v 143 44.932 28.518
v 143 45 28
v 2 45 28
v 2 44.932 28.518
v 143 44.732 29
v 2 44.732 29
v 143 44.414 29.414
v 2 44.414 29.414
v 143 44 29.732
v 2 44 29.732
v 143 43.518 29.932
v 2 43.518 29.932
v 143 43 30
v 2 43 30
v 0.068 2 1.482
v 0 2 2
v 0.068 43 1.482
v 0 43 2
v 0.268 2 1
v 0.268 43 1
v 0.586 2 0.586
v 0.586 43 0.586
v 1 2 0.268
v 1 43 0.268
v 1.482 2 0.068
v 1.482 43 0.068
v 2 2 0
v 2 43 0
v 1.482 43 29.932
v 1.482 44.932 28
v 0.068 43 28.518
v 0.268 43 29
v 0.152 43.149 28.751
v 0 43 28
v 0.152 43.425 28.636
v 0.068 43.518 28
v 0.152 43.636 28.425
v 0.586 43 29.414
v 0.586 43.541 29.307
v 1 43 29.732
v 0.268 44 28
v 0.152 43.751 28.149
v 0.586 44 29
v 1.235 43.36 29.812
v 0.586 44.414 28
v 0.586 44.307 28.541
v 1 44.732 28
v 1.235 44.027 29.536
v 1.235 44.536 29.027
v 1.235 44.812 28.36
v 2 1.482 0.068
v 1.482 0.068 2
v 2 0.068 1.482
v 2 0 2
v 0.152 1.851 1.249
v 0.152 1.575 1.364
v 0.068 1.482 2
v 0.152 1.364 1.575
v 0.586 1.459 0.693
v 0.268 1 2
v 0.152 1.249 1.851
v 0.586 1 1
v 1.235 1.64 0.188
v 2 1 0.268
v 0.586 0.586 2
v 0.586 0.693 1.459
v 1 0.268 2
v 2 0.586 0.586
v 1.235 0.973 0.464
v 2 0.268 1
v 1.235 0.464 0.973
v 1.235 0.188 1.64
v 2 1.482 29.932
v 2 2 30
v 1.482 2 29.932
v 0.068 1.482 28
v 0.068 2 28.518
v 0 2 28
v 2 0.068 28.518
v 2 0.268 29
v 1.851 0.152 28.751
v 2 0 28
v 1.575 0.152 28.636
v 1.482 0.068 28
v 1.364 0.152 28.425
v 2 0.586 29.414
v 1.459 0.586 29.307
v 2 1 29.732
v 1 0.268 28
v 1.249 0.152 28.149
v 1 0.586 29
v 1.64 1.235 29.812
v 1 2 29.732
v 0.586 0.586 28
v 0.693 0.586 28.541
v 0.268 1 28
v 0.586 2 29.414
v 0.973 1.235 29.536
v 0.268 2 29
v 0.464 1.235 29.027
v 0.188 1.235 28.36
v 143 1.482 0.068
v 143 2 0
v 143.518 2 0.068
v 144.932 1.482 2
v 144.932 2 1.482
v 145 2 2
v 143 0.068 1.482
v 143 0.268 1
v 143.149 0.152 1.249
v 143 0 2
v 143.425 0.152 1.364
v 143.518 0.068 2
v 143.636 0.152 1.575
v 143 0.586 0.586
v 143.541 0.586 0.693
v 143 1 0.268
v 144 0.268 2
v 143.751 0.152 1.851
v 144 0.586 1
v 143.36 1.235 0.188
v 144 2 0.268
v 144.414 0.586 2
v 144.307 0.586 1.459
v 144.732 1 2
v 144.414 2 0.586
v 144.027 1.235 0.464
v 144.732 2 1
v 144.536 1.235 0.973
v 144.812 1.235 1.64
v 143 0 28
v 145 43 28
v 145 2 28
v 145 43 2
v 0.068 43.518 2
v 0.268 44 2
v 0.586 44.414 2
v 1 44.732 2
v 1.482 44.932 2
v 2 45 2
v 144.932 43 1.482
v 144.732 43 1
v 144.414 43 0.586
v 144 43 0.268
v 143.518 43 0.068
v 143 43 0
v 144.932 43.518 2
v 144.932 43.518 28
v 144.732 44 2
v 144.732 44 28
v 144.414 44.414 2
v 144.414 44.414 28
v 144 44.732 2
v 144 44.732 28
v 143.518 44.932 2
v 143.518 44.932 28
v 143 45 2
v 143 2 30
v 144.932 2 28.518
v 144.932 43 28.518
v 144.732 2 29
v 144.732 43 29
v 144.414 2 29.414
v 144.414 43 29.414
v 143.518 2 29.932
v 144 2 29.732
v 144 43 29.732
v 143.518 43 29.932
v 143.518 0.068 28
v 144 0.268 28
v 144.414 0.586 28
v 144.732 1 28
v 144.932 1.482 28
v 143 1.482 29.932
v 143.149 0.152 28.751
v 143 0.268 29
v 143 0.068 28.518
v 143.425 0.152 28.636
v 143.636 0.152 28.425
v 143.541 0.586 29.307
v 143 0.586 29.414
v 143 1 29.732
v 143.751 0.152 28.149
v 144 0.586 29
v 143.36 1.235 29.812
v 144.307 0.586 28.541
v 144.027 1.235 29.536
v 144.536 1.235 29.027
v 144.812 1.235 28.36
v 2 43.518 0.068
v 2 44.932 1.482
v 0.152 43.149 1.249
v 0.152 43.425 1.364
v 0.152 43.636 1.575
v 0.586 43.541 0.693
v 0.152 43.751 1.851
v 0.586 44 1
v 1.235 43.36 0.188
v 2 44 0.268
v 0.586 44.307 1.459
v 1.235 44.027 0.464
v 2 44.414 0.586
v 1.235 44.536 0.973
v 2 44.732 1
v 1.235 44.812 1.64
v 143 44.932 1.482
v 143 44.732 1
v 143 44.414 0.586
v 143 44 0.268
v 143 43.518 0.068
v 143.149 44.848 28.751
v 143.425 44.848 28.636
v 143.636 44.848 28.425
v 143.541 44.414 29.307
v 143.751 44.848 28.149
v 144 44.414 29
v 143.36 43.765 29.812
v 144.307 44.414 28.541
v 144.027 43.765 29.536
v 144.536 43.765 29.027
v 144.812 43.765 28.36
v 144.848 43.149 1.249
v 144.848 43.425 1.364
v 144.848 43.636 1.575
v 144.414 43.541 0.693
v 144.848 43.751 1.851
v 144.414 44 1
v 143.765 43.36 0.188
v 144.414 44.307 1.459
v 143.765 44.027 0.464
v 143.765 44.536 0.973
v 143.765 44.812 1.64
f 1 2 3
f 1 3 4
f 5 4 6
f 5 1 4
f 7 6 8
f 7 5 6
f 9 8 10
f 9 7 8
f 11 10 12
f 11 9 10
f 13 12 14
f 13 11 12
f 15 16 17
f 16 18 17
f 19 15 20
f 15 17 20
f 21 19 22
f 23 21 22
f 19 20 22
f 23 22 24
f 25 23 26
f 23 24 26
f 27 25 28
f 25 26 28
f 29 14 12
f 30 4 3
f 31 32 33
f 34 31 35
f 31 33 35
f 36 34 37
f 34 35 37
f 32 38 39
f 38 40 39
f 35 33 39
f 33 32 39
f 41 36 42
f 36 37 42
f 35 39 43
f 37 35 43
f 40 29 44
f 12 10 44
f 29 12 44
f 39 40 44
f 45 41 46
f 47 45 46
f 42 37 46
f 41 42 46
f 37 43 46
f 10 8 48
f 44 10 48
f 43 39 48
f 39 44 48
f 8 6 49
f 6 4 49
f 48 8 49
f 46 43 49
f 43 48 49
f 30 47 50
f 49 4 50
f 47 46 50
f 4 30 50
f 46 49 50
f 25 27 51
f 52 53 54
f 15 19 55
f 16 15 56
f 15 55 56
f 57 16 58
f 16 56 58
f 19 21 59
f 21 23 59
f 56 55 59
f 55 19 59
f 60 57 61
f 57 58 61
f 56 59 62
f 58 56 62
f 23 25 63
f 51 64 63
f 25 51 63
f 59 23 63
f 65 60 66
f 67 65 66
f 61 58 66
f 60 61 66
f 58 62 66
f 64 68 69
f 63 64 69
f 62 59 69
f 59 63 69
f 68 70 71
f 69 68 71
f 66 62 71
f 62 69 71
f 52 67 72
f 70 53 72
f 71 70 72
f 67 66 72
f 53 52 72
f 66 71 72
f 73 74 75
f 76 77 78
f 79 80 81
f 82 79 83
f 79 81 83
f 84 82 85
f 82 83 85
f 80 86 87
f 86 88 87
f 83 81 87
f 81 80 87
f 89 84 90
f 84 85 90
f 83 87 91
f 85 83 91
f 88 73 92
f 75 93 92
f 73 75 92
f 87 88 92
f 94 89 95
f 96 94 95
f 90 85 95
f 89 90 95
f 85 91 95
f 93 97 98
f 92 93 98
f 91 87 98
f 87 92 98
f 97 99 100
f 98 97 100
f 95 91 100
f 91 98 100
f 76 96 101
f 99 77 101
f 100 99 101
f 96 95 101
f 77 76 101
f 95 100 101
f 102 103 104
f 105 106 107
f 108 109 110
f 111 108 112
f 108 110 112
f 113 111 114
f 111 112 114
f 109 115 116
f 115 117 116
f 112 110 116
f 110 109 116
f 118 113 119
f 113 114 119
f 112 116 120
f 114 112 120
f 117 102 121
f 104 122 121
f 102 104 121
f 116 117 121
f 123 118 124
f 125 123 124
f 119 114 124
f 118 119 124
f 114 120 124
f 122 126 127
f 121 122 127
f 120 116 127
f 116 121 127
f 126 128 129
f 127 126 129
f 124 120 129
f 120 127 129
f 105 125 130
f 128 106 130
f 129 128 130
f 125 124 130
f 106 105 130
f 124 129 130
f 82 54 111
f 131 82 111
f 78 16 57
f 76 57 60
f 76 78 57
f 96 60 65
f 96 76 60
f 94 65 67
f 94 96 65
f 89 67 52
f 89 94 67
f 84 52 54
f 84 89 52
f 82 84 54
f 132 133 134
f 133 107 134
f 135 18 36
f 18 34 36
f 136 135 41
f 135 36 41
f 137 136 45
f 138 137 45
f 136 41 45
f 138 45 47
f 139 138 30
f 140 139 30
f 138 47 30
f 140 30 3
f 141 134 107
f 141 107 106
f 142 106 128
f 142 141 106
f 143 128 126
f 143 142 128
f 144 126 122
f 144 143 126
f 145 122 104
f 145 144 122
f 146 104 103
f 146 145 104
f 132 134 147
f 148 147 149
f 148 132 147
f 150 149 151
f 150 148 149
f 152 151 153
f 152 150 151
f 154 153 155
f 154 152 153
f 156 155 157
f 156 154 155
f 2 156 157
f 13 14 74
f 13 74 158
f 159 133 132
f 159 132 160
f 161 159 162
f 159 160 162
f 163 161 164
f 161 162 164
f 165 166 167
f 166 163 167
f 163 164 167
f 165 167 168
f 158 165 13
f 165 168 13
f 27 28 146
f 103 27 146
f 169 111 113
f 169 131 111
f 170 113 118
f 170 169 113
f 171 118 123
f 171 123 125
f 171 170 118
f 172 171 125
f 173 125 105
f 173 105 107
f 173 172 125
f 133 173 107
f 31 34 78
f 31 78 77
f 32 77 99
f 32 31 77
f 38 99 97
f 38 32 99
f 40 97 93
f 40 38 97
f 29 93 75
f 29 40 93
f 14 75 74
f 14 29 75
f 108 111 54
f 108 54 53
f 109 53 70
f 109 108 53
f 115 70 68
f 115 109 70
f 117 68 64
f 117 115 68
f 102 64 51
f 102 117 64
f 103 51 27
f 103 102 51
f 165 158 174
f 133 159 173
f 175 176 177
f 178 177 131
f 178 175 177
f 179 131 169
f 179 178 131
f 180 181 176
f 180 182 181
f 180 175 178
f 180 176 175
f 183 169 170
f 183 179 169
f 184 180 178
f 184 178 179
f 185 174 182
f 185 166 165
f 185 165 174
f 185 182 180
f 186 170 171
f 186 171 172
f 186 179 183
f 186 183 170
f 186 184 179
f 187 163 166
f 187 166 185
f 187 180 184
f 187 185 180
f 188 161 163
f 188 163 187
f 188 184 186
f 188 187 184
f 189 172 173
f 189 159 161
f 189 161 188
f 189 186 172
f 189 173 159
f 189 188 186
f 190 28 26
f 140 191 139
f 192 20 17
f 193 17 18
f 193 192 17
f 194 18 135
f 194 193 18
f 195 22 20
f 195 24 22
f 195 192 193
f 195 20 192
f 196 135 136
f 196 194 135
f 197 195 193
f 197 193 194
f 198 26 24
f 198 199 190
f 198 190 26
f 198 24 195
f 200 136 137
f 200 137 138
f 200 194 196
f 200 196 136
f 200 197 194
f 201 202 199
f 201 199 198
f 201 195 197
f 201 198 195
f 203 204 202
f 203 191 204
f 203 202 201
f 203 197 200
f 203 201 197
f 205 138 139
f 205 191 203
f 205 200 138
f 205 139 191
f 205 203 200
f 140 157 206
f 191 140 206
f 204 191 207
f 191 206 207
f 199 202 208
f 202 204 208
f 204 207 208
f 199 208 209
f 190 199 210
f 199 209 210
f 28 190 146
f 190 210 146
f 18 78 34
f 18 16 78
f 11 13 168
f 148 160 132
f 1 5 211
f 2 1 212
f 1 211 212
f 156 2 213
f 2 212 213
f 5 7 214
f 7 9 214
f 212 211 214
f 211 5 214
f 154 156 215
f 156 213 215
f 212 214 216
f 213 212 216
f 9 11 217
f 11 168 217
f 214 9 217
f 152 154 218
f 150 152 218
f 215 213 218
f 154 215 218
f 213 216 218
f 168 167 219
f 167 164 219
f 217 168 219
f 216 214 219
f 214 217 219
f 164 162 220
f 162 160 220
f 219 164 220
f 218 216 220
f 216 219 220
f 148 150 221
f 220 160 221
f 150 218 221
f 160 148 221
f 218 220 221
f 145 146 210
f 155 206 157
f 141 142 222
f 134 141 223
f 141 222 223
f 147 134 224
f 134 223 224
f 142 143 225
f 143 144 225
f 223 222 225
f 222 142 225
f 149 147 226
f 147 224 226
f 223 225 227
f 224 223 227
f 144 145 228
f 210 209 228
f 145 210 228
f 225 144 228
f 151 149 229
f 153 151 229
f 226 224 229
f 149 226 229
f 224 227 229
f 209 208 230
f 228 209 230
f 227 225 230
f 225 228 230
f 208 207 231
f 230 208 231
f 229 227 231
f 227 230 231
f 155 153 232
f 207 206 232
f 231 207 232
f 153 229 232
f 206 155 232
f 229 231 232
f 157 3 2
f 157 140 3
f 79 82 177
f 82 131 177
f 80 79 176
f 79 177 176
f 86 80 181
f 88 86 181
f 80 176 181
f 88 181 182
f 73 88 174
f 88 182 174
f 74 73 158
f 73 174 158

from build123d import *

# Parameters (mm, degrees)
ESQUISSE1_W        = 145
ESQUISSE1_H        = 45
BOSS_EXTRU_1_DEPTH = 30
CONG_1_R           = 2


with BuildPart() as part:
    # Esquisse1 → Boss.-Extru.1 (new body)
    with BuildSketch(Plane.XY):
        with Locations((72.5, 22.5)):
            Rectangle(ESQUISSE1_W, ESQUISSE1_H)
    extrude(amount=BOSS_EXTRU_1_DEPTH)

    # Congé1
    cong_1_edges = [part.edges().sort_by_distance(p)[0] for p in [
        (145, 22.5, 30),
        (72.5, 45, 30),
        (0, 22.5, 30),
        (72.5, 45, 0),
        (145, 22.5, 0),
        (72.5, 0, 0),
        (0, 22.5, 0),
        (72.5, 0, 30),
        (0, 45, 15),
        (145, 45, 15),
        (145, 0, 15),
        (0, 0, 15),
    ]]
    fillet(cong_1_edges, radius=CONG_1_R)


solid = part.part
